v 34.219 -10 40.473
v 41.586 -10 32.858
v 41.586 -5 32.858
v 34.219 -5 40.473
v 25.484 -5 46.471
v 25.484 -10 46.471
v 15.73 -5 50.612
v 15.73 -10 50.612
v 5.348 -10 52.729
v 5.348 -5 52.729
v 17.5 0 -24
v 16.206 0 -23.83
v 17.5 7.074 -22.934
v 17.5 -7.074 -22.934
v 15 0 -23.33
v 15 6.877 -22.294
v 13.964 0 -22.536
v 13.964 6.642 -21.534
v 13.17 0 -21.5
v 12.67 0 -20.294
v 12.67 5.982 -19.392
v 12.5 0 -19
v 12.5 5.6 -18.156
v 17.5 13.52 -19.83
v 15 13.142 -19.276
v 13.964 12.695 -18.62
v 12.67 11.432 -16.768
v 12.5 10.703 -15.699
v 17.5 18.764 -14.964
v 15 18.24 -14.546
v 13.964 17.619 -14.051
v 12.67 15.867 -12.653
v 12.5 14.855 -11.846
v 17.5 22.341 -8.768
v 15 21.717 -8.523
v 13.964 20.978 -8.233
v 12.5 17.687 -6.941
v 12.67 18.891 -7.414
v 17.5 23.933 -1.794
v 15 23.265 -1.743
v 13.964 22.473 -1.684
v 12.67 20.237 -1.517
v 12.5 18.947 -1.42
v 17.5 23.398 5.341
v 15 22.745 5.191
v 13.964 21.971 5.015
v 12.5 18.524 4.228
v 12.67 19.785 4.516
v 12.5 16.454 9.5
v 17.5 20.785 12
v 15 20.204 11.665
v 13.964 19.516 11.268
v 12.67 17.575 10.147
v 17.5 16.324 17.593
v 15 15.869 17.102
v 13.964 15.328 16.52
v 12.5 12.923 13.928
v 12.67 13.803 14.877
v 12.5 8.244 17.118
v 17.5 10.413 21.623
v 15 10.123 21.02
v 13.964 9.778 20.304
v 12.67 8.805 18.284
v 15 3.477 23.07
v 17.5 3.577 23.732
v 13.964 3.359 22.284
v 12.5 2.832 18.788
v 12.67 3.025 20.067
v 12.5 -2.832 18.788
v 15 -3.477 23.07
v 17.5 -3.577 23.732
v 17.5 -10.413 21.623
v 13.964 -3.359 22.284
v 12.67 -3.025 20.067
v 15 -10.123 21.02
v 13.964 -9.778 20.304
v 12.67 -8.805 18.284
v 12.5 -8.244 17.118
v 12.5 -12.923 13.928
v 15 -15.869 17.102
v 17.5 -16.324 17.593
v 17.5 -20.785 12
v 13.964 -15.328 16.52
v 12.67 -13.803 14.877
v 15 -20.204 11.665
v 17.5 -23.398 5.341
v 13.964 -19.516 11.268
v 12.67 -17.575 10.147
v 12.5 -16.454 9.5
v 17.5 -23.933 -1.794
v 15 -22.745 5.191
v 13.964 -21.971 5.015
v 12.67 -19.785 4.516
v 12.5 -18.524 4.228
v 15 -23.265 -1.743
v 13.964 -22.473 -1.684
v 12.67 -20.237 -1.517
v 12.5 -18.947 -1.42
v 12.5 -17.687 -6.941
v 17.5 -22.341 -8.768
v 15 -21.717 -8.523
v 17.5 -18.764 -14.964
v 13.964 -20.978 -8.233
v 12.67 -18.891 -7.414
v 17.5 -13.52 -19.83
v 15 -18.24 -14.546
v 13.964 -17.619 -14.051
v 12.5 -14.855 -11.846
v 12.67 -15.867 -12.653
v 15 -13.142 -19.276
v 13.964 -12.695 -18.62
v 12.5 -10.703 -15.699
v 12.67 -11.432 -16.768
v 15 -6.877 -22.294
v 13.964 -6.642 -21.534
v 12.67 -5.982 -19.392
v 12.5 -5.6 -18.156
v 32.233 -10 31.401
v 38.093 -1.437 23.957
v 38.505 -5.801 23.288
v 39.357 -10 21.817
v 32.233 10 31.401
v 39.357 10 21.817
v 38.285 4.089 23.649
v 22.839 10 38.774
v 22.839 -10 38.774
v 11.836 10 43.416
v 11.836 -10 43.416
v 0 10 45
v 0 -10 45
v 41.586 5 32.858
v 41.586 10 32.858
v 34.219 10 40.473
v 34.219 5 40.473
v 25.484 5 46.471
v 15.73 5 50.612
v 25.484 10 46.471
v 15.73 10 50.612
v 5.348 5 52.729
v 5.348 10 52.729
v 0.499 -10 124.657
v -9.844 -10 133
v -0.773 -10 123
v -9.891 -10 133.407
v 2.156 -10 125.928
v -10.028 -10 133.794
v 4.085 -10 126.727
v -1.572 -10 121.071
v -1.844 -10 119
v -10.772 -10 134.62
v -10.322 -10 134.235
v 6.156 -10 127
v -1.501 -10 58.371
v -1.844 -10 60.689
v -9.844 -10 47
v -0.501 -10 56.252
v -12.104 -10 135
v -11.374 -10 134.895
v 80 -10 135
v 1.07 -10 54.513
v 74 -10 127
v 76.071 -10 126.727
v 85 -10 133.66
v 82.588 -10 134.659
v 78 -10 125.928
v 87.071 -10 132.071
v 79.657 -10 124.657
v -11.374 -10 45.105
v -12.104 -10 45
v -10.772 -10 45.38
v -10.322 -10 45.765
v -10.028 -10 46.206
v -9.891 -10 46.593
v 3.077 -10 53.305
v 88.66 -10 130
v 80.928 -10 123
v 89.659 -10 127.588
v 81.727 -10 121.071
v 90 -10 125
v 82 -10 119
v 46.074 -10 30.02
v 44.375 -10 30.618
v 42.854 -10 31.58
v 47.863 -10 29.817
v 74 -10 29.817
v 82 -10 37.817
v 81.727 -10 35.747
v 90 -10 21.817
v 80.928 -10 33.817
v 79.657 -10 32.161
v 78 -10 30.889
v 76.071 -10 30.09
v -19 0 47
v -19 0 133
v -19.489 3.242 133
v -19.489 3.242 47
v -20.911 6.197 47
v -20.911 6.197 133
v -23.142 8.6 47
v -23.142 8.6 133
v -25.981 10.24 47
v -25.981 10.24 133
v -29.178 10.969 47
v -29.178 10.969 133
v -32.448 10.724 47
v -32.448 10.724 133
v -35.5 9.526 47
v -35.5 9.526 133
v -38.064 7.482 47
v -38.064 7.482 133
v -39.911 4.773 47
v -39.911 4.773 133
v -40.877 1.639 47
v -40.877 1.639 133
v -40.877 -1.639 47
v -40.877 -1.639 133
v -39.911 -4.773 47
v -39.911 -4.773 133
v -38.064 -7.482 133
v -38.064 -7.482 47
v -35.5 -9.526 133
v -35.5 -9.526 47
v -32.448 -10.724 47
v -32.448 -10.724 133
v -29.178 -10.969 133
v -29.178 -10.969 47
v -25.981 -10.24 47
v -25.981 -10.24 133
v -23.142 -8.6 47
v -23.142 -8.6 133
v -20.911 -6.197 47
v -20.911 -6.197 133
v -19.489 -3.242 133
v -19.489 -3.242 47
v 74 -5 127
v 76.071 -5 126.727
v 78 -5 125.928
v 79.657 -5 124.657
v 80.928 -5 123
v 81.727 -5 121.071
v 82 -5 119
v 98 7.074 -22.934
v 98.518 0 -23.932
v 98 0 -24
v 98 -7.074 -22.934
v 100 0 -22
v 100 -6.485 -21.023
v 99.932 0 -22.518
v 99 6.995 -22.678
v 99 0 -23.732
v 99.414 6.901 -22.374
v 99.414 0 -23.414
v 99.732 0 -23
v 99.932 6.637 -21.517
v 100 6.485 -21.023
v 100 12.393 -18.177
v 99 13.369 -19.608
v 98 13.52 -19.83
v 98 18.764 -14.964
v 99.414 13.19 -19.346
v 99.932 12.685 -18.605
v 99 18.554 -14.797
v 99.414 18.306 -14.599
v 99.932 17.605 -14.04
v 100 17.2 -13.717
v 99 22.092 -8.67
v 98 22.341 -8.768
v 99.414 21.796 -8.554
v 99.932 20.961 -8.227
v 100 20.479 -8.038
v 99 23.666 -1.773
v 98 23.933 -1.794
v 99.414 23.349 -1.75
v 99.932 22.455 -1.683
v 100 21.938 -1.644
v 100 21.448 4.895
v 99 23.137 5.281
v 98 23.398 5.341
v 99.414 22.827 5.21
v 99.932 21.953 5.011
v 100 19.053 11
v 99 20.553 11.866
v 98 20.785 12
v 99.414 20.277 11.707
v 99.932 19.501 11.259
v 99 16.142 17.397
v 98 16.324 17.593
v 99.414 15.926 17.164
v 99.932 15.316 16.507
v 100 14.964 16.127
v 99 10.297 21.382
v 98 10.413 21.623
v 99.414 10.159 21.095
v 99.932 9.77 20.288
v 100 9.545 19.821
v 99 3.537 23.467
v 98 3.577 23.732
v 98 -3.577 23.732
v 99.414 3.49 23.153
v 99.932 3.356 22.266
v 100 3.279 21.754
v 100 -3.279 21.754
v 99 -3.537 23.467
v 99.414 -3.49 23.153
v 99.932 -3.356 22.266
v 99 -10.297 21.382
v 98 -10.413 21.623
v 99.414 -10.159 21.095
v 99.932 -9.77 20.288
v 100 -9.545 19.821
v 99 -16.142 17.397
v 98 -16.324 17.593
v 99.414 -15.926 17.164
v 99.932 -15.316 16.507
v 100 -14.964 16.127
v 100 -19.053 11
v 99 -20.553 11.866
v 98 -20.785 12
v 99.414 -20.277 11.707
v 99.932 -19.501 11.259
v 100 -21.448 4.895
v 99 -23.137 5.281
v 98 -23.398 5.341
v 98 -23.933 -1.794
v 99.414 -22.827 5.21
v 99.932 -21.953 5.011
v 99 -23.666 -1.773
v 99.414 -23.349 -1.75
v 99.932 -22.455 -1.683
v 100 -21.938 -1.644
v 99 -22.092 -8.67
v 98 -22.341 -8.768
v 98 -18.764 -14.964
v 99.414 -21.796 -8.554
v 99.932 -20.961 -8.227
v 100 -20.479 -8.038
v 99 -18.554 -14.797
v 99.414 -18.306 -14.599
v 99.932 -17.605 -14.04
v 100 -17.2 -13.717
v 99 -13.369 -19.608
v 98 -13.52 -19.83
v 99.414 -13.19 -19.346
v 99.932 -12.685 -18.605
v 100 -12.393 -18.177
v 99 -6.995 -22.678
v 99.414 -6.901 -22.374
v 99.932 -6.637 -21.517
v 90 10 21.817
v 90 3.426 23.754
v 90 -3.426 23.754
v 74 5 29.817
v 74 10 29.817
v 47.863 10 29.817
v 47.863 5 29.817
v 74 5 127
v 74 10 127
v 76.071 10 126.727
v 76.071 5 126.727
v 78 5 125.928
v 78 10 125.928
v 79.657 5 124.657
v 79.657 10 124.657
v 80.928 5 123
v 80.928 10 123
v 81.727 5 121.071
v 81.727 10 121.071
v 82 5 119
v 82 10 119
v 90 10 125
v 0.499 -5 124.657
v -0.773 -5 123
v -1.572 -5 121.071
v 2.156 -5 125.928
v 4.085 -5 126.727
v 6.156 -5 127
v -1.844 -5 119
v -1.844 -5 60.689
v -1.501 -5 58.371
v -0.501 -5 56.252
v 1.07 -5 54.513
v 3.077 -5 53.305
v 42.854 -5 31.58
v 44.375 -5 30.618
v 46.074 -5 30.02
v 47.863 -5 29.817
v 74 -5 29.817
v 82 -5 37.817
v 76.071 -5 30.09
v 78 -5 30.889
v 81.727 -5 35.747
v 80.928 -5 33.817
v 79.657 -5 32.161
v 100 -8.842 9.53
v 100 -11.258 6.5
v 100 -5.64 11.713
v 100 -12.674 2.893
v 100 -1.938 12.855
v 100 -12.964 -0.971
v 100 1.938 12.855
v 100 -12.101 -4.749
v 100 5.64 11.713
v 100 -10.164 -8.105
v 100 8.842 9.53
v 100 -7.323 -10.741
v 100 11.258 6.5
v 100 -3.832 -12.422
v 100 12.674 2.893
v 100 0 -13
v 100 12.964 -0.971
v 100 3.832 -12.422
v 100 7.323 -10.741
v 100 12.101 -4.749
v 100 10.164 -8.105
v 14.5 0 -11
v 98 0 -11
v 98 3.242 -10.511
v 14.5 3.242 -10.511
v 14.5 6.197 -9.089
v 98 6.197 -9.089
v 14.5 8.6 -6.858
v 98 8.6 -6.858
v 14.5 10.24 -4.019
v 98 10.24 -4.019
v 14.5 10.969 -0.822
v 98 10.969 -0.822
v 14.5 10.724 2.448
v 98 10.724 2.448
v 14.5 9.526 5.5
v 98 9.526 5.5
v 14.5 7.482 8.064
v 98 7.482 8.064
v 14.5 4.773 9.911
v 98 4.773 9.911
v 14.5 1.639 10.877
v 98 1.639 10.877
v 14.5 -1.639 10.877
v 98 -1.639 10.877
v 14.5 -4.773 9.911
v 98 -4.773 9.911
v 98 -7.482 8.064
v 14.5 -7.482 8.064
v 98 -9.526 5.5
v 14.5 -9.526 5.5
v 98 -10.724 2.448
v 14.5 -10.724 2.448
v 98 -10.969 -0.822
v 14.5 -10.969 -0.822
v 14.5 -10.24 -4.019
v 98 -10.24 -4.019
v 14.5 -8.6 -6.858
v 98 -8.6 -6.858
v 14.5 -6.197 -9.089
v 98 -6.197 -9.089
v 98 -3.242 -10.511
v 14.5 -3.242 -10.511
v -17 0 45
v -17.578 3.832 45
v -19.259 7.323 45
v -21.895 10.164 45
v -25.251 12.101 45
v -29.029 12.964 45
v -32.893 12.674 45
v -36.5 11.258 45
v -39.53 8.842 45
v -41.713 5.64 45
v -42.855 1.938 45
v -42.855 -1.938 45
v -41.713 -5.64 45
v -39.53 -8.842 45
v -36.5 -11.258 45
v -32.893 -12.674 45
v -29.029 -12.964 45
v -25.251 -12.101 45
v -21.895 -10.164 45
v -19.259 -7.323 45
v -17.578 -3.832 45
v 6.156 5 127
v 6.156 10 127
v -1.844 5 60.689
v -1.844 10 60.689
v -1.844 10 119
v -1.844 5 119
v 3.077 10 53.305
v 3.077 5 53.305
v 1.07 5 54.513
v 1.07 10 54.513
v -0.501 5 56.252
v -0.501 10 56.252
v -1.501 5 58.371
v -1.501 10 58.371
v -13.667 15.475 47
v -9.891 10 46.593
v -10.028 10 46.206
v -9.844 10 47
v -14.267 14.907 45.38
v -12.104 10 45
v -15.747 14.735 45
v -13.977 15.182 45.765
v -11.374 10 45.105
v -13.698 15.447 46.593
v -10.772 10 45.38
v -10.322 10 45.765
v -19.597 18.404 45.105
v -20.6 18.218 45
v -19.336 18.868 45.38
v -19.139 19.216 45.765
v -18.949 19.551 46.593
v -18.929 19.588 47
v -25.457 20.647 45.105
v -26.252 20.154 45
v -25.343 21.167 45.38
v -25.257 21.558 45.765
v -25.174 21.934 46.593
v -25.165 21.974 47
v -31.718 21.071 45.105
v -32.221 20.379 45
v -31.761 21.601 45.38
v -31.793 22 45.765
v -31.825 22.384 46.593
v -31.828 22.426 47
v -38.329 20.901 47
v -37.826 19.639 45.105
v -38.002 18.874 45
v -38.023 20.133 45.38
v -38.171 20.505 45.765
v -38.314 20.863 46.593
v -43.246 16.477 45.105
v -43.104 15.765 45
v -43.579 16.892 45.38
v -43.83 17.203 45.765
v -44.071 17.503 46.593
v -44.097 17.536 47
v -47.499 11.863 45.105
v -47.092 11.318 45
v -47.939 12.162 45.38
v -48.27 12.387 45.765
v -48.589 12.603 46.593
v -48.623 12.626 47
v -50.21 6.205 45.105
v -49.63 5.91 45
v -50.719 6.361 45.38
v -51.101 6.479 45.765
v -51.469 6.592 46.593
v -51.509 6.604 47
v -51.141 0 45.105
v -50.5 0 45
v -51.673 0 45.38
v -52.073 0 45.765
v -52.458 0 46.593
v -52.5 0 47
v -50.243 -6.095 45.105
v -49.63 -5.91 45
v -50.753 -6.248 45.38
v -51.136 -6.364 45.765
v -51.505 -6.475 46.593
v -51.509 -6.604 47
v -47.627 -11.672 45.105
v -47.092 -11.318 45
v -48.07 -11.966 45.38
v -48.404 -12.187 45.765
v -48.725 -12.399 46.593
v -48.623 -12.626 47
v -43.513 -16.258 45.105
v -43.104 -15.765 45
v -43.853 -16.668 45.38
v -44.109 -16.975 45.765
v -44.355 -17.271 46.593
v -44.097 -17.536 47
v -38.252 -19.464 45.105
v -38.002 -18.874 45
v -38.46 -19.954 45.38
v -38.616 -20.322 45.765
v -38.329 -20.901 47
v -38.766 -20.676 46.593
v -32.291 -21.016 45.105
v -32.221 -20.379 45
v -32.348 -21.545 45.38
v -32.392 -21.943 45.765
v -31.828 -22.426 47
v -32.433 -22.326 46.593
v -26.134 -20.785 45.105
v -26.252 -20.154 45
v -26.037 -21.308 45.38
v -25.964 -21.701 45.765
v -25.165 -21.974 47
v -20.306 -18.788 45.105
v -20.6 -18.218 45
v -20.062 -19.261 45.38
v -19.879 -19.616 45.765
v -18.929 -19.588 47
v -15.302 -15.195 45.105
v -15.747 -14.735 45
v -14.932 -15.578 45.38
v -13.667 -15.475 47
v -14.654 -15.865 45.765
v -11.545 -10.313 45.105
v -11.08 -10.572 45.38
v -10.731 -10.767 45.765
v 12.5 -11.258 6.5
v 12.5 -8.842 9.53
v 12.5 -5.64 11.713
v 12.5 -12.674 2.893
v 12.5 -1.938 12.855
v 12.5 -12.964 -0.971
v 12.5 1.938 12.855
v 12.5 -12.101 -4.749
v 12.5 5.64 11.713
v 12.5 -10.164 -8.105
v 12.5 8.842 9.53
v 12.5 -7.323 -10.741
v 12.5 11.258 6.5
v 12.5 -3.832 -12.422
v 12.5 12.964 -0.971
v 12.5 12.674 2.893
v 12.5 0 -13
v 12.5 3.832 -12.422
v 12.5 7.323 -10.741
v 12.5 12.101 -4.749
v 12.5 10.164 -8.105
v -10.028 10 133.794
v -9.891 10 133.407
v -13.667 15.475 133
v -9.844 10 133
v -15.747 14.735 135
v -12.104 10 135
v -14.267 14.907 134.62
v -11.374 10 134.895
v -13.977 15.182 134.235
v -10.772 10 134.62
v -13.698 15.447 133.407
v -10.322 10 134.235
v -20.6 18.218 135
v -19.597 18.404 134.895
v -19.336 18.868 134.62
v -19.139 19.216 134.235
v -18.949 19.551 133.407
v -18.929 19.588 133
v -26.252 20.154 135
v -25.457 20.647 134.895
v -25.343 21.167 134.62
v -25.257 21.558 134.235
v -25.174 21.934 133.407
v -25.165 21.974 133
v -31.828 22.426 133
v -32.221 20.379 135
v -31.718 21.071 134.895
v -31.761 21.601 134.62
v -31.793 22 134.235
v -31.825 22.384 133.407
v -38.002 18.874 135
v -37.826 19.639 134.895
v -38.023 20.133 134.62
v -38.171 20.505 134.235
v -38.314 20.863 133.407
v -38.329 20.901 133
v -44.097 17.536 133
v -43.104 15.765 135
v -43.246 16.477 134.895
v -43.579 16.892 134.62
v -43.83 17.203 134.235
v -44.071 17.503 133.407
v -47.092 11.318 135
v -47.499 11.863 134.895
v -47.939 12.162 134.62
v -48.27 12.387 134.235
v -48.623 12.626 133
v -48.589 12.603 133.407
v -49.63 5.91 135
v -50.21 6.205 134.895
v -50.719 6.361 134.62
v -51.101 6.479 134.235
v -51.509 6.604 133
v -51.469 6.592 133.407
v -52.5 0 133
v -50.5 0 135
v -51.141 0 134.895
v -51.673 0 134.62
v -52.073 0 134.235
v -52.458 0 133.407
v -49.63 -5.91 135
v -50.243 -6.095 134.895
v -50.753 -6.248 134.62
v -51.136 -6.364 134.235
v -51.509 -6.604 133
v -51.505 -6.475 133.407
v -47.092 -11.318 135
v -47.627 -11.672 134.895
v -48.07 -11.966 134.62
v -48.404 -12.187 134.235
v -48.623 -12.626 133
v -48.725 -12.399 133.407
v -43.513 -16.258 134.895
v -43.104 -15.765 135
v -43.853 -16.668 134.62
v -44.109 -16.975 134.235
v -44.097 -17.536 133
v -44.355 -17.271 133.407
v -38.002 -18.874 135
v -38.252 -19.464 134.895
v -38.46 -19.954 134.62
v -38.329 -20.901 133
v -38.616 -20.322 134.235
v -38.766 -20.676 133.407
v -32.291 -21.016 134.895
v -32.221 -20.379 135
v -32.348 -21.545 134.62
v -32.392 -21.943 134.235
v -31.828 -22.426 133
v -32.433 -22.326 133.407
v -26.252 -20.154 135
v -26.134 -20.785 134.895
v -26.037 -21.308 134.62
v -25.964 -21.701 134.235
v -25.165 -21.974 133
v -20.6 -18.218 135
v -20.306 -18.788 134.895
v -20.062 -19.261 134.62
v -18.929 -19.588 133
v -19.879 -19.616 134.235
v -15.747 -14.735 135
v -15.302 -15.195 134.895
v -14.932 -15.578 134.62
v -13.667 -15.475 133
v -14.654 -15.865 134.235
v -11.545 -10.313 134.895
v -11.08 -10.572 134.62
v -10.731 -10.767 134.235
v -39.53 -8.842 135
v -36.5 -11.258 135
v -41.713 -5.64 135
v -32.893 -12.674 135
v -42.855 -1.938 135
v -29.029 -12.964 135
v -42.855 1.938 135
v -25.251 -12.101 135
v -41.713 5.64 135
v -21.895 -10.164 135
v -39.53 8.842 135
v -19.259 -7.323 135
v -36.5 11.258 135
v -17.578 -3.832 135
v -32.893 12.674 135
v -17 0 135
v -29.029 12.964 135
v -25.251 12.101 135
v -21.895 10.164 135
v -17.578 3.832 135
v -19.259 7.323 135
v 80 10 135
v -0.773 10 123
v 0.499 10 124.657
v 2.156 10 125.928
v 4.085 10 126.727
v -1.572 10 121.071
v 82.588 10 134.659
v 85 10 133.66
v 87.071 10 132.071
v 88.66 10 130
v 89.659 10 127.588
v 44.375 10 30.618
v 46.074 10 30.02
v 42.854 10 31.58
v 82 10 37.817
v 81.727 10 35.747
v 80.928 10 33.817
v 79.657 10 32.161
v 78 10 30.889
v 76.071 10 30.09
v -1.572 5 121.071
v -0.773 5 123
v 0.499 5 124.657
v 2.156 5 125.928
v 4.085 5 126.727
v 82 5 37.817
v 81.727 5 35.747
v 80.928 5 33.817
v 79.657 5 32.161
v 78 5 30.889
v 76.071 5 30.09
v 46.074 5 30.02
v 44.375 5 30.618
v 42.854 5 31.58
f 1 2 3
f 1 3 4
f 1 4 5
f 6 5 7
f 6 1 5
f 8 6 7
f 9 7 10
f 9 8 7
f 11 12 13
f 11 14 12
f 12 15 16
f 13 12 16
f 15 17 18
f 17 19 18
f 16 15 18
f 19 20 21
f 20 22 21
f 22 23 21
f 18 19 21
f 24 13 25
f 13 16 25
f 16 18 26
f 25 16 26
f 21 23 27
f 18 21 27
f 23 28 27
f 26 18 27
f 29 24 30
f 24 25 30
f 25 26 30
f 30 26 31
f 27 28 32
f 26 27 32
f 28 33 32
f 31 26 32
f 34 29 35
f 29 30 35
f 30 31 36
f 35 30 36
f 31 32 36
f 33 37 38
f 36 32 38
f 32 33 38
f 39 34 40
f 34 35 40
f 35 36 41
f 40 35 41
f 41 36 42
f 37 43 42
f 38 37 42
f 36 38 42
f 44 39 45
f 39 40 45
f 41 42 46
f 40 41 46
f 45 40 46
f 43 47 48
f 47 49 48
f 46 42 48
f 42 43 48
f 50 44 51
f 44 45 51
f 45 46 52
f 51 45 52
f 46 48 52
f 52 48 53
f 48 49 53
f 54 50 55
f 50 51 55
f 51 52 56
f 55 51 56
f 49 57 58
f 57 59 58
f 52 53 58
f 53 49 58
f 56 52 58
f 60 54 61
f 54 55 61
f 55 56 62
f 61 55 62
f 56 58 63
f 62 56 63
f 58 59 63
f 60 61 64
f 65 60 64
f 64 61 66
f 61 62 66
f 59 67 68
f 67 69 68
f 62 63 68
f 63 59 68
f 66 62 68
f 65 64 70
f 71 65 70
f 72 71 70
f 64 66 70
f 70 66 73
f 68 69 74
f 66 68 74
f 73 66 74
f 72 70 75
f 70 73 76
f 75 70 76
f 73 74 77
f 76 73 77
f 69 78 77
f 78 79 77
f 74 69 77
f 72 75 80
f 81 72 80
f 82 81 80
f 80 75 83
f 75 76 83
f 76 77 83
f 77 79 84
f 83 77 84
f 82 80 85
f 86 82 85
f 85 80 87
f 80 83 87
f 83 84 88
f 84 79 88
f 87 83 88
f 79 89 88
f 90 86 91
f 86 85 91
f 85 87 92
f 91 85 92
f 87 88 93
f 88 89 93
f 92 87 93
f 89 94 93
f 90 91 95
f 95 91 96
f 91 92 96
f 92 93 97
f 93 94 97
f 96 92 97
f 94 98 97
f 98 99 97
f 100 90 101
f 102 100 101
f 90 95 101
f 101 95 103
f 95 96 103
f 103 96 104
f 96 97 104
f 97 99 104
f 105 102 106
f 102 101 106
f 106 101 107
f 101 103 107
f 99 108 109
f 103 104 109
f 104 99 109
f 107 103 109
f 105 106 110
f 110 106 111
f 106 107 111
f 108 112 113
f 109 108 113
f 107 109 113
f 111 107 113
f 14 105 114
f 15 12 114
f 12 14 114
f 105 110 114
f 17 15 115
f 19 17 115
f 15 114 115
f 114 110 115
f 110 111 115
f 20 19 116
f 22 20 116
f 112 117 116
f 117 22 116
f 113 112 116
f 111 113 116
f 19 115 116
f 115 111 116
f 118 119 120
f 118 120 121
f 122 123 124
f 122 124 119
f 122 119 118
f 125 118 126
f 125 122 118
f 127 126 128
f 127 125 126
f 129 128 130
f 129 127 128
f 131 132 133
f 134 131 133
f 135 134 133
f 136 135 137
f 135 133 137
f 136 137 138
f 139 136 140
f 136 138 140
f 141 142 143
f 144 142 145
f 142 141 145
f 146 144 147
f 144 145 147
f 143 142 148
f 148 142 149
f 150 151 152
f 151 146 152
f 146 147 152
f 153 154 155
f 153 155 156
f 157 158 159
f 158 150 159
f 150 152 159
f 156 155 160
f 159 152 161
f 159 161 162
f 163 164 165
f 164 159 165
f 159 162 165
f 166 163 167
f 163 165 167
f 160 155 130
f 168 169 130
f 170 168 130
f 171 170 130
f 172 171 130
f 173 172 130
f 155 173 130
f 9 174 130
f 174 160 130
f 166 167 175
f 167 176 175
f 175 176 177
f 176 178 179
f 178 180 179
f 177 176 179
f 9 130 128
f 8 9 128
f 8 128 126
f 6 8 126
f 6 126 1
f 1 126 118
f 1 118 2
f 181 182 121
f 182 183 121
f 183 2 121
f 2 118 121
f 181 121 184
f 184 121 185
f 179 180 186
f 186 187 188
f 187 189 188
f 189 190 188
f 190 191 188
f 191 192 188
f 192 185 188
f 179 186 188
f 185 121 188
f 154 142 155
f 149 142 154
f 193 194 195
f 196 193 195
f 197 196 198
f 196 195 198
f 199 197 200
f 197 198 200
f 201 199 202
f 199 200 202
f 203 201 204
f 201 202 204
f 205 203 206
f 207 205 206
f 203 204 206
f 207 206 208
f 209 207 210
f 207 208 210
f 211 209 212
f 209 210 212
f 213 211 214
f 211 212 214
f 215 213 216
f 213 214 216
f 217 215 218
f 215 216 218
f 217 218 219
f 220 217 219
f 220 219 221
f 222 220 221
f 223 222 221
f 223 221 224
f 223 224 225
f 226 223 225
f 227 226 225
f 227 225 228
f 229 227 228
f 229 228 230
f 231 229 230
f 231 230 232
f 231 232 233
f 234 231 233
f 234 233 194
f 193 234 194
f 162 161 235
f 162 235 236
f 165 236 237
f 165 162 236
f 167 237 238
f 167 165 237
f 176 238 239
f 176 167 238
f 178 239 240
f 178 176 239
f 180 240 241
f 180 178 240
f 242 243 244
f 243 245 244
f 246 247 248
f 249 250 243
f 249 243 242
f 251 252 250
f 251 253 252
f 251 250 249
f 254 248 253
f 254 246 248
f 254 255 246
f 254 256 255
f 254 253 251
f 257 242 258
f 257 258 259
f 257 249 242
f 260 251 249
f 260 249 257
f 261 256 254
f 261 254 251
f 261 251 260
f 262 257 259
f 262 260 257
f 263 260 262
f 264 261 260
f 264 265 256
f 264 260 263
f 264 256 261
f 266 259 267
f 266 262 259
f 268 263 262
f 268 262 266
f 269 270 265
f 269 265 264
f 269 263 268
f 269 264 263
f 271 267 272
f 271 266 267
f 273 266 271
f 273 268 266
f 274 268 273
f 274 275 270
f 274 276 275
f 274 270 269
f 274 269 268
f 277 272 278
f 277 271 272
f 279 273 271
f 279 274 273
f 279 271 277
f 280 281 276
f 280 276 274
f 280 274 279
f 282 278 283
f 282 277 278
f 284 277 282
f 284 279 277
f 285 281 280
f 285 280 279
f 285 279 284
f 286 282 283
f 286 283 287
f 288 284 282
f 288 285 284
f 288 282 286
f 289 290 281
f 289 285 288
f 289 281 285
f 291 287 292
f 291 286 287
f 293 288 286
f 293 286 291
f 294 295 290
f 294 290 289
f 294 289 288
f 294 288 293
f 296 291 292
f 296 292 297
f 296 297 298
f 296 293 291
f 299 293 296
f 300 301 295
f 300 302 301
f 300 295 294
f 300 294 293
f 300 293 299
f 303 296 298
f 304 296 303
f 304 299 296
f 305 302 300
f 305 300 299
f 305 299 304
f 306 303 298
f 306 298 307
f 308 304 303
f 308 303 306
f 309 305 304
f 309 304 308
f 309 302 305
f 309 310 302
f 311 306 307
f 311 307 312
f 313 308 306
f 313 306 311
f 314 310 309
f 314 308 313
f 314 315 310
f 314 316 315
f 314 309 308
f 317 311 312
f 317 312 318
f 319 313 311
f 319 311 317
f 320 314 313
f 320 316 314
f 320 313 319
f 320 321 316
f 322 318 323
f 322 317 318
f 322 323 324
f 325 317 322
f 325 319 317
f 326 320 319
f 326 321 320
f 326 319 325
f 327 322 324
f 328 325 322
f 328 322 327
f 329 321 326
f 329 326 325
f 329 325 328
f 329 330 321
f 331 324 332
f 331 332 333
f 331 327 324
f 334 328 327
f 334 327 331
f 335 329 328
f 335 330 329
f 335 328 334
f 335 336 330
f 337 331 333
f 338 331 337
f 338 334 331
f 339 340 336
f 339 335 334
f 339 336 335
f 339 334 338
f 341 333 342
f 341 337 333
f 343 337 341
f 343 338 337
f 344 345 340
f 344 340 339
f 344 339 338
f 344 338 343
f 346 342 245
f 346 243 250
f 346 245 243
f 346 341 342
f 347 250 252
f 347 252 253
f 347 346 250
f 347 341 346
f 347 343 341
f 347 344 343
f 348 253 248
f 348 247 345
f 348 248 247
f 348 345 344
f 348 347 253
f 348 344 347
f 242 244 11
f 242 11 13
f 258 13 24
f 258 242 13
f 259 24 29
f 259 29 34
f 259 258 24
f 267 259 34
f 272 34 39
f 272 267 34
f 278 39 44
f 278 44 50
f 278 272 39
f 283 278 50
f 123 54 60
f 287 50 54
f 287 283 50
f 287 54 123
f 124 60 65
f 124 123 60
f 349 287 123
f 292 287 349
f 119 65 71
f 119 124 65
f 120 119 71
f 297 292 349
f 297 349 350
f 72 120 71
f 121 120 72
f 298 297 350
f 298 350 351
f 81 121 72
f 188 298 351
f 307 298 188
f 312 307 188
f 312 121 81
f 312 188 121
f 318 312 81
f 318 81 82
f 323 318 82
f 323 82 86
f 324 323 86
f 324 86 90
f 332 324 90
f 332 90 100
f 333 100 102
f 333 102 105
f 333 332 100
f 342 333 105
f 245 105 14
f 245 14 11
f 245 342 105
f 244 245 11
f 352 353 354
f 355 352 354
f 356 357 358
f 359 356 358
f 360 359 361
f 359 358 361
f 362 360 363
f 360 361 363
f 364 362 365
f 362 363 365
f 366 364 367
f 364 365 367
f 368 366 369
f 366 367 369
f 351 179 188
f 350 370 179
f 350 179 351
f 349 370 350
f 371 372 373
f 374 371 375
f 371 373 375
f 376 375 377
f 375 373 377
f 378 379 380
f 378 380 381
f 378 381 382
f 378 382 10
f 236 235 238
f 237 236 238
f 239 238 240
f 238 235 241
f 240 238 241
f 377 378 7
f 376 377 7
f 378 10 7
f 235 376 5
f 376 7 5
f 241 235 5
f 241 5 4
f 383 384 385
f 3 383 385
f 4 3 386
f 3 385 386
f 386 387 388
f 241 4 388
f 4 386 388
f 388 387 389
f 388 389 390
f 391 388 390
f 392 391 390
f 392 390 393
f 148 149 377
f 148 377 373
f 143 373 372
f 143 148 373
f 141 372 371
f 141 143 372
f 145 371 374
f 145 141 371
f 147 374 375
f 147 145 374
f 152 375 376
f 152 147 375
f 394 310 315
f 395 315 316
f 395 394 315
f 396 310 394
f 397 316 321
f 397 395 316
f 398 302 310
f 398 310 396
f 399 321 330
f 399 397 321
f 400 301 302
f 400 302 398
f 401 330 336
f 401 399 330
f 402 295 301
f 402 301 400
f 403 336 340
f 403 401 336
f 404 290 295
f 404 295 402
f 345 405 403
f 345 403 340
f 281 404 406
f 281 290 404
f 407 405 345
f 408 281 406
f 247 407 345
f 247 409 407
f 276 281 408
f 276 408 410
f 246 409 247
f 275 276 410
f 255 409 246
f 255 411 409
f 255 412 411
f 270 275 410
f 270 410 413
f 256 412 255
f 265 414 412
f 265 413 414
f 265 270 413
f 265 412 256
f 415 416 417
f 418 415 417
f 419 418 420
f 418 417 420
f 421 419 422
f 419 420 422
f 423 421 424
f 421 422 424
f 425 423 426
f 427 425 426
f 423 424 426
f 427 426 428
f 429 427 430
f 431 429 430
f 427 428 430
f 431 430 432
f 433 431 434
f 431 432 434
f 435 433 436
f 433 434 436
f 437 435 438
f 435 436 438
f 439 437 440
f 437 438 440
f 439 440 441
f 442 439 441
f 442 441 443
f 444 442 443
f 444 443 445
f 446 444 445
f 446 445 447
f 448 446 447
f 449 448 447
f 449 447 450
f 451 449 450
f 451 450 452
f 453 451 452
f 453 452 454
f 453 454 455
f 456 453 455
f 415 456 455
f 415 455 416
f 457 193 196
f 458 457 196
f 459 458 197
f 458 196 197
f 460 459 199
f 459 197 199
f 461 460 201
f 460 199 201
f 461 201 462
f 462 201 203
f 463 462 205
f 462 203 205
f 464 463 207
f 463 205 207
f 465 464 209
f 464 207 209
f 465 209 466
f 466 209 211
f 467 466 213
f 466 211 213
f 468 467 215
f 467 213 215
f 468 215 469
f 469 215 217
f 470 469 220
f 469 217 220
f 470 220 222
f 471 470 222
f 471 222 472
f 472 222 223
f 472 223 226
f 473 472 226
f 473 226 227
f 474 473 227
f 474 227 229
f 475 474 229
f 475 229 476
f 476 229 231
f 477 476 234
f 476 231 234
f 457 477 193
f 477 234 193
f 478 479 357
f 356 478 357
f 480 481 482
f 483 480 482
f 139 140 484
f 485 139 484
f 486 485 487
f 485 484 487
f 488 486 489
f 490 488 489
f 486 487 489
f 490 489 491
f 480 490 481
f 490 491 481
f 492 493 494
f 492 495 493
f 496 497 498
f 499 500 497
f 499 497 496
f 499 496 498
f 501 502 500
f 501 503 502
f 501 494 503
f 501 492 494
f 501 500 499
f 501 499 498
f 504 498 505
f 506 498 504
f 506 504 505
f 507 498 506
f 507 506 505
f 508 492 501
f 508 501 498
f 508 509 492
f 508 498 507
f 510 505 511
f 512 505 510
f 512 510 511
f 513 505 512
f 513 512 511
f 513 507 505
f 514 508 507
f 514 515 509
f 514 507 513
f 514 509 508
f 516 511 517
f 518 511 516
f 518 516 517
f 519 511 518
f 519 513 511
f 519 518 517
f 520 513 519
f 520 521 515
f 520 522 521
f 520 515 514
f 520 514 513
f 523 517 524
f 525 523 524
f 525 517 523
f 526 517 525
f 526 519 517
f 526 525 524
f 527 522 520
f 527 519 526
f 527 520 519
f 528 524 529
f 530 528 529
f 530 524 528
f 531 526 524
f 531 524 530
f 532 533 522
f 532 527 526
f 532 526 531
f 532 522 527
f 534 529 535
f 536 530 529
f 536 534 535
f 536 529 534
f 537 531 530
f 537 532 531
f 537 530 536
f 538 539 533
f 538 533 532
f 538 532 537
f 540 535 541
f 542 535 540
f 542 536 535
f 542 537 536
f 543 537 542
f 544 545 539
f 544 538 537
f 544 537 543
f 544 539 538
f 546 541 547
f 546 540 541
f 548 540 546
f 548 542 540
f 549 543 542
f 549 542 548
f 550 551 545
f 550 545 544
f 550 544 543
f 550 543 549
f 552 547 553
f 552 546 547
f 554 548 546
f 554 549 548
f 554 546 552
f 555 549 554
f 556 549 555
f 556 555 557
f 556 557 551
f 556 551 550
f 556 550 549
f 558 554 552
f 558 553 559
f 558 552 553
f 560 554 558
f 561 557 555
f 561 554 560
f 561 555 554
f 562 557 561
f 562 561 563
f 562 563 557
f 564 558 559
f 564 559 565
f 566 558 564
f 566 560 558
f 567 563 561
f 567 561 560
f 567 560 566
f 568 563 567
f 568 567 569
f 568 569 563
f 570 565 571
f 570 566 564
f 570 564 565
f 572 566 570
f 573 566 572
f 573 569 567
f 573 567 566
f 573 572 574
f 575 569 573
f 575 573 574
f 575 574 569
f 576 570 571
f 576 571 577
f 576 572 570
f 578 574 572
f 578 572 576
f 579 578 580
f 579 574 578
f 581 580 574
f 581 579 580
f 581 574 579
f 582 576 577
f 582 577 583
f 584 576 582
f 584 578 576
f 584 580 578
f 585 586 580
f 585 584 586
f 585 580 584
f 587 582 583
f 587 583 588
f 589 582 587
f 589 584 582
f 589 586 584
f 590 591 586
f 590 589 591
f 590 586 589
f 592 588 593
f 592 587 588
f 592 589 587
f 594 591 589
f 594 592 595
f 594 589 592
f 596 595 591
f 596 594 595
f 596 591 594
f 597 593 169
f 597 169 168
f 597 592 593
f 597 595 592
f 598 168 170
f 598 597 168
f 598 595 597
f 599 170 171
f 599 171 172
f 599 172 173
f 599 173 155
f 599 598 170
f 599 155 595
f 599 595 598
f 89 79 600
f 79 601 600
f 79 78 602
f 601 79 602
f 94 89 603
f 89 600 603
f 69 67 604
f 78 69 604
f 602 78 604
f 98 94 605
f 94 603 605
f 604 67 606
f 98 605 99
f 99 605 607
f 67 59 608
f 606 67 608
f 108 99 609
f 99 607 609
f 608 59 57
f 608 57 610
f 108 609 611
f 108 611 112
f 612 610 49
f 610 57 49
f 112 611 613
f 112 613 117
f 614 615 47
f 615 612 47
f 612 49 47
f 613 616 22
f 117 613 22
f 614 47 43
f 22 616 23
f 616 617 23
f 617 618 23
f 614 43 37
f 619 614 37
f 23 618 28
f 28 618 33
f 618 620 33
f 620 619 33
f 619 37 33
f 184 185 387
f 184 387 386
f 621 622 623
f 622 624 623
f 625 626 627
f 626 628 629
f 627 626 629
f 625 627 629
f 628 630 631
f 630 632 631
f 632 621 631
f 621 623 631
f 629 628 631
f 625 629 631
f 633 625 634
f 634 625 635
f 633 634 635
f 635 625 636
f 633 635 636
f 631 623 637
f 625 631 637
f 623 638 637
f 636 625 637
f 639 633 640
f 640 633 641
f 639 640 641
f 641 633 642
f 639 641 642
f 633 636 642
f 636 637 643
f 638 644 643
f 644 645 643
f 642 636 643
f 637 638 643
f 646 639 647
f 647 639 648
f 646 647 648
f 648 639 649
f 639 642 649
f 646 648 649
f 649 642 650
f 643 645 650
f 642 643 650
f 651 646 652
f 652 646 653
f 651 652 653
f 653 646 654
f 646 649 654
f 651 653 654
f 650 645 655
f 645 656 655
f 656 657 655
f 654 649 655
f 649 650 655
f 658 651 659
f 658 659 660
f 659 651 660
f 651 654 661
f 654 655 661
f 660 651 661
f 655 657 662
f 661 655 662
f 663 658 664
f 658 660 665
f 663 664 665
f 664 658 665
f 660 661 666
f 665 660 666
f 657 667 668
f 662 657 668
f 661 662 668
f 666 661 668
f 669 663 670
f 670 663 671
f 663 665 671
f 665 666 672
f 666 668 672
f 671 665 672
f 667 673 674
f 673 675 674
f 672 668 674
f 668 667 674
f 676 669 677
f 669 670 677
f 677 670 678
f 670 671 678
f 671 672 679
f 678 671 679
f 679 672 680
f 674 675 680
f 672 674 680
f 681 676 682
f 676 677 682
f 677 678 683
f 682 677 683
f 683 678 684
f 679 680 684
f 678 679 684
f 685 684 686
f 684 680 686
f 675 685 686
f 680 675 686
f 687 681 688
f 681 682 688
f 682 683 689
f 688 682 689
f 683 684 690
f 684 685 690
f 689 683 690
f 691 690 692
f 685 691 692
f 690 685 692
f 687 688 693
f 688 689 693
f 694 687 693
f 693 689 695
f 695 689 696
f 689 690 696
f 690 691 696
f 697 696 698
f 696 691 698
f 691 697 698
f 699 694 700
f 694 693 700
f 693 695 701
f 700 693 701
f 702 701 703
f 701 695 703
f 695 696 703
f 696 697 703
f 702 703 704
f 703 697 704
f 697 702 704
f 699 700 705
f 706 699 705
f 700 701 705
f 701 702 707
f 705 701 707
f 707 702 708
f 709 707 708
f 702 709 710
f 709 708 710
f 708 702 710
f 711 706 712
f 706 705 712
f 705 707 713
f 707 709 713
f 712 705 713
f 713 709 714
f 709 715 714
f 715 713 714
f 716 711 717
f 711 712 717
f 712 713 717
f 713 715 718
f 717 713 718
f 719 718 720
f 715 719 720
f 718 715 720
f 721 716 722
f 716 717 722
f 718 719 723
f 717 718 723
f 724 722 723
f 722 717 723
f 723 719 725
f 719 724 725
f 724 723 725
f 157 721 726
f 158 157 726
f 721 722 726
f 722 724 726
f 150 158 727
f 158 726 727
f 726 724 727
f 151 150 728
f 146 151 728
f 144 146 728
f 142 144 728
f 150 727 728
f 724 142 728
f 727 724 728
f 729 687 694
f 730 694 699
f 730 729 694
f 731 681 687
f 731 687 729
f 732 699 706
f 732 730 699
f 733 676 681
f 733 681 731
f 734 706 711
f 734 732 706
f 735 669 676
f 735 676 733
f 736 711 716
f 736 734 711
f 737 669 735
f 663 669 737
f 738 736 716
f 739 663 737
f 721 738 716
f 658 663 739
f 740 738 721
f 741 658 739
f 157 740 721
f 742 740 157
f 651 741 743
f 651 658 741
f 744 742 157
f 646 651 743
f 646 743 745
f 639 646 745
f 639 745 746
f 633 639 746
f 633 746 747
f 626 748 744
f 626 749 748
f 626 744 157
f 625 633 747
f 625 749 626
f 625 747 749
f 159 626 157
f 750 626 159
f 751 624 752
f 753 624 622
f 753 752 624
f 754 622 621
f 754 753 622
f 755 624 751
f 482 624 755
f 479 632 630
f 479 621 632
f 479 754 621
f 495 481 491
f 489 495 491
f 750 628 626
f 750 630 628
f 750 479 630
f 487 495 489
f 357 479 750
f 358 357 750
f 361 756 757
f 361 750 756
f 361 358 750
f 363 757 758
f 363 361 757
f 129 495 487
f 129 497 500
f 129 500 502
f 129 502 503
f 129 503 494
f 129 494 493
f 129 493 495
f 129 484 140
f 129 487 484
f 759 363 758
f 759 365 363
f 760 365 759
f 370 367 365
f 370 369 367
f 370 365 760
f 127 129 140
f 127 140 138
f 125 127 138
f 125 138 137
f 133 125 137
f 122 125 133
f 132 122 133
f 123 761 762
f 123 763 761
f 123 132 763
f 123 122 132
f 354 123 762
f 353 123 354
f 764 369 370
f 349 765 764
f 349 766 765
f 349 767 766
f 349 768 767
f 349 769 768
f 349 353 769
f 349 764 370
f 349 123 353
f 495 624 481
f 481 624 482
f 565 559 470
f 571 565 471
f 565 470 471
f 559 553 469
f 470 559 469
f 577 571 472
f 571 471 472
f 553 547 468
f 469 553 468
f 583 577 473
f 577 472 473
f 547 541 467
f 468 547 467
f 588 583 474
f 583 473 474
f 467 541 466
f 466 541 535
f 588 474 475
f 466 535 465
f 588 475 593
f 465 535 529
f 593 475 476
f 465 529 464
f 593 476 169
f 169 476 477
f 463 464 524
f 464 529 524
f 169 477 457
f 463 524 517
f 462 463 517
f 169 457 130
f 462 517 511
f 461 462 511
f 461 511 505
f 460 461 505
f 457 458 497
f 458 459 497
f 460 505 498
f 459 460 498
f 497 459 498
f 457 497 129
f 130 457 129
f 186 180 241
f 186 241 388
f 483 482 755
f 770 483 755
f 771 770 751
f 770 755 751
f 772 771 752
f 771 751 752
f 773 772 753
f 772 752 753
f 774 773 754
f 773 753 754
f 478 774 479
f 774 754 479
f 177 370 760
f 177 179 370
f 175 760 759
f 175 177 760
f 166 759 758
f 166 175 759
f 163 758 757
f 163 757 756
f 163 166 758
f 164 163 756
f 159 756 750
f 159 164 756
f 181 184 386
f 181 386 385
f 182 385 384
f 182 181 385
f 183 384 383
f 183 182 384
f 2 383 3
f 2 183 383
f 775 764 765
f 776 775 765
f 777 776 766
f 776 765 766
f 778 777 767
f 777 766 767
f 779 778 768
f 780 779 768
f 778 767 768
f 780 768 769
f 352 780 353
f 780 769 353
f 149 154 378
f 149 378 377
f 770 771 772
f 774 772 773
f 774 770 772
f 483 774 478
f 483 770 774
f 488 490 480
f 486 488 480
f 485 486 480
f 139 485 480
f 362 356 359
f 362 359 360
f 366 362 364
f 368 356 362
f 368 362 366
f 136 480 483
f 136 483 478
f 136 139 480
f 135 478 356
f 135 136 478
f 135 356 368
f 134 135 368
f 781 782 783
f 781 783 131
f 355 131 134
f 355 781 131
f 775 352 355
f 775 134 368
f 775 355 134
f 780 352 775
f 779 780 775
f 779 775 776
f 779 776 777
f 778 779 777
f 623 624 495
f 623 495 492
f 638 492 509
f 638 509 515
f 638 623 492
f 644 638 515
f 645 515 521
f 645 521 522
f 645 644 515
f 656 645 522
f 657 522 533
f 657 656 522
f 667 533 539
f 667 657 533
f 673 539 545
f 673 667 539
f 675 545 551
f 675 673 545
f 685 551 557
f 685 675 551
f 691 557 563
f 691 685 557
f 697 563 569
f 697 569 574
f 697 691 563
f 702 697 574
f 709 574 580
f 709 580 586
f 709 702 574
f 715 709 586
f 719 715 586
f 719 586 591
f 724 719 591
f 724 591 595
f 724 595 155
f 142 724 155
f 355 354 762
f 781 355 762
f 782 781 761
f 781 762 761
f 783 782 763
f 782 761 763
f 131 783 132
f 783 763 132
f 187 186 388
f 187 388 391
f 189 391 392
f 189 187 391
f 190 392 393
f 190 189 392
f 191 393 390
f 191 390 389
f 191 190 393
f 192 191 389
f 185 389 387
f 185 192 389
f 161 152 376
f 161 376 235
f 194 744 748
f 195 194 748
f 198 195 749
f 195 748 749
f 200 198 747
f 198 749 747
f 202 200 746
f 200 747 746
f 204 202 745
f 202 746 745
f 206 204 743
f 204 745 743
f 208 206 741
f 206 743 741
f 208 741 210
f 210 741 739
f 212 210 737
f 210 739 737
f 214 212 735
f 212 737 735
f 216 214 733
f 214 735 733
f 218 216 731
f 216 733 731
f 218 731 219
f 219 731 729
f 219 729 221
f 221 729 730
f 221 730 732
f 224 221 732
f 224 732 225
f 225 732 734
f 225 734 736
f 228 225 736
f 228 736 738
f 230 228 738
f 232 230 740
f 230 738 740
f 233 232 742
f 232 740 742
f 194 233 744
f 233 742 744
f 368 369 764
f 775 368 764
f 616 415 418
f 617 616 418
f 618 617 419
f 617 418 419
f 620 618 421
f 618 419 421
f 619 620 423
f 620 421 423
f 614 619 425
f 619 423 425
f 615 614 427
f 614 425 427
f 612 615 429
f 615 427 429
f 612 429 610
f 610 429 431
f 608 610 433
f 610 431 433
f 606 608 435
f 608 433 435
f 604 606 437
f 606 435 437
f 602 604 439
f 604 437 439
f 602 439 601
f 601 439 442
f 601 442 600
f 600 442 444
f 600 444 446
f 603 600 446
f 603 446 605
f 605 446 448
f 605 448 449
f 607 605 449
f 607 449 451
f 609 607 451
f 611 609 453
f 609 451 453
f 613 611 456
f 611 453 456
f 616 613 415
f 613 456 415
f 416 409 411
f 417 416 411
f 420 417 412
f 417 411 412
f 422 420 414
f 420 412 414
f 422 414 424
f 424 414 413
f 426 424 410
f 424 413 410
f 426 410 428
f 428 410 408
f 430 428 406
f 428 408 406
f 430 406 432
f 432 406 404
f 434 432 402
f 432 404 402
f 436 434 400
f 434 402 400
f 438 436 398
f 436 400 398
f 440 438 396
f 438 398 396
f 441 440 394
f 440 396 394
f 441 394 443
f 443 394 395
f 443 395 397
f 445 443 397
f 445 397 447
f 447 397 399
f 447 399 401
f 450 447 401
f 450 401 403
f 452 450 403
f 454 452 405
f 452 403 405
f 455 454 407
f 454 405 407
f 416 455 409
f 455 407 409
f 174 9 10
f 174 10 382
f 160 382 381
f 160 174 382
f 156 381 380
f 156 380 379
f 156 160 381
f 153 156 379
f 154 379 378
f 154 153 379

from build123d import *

# Parameters (mm, degrees)
BOSS_EXTRUDE1_DEPTH = 10
SKETCH2_R           = 22.5
BOSS_EXTRUDE2_DEPTH = 90
SKETCH3_R           = 11
CUT_EXTRUDE1_DEPTH  = 164.802472509
BOSS_EXTRUDE3_START = 10
SKETCH4_R           = 24
BOSS_EXTRUDE3_DEPTH = 87.5
SKETCH5_R           = 11
CUT_EXTRUDE2_DEPTH  = 206.078643463
CUT_EXTRUDE3_DEPTH  = 5
FILLET1_R           = 10
FILLET2_R           = 5
FILLET3_R           = 2
CHAMFER1_SIZE       = 2


with BuildPart() as part:
    # Sketch1 → Boss-Extrude1 (new, symmetric)
    with BuildSketch(Plane(origin=(0, 0, 0), x_dir=(1, 0, 0), z_dir=(0, 1, 0))):
        with BuildLine():
            ThreePointArc((45, 0), (31.819805153, -31.819805153), (0, -45))
            Line((0, -45), (-45, -45))
            Line((-45, -45), (-45, -135))
            Line((-45, -135), (90, -135))
            Line((90, -135), (90, 0))
            Line((90, 0), (45, 0))
        make_face()
    extrude(amount=BOSS_EXTRUDE1_DEPTH, both=True)

    # Sketch2 → Boss-Extrude2 (add)
    with BuildSketch(Plane.XY.offset(135)):
        with Locations((-30, 0)):
            Circle(SKETCH2_R)
    extrude(amount=-BOSS_EXTRUDE2_DEPTH)

    # Sketch3 → Cut-Extrude1 (cut, through all)
    with BuildSketch(Plane.XY.offset(135)):
        with Locations((-30, 0)):
            Circle(SKETCH3_R)
    extrude(amount=-CUT_EXTRUDE1_DEPTH, mode=Mode.SUBTRACT)

    # Sketch4 → Boss-Extrude3 (add)
    with BuildSketch(Plane(origin=(90, 0, 0), x_dir=(0, 0, -1), z_dir=(1, 0, 0)).offset(BOSS_EXTRUDE3_START)):
        Circle(SKETCH4_R)
    extrude(amount=-BOSS_EXTRUDE3_DEPTH)

    # Sketch5 → Cut-Extrude2 (cut, through all)
    with BuildSketch(Plane(origin=(100, 0, 0), x_dir=(0, 0, -1), z_dir=(1, 0, 0))):
        Circle(SKETCH5_R)
    extrude(amount=-CUT_EXTRUDE2_DEPTH, mode=Mode.SUBTRACT)

    # Sketch6 → Cut-Extrude3 (cut)
    with BuildSketch(Plane(origin=(0, 10, 0), x_dir=(1, 0, 0), z_dir=(0, 1, 0))):
        with BuildLine():
            Line((74, -29.817424229), (47.862745687, -29.817424229))
            ThreePointArc((47.862745687, -29.817424229), (44.375432792, -30.617518065), (41.585664285, -32.857762035))
            ThreePointArc((41.585664285, -32.857762035), (25.48374719, -46.471266705), (5.348346748, -52.729452748))
            ThreePointArc((5.348346748, -52.729452748), (0.220226063, -55.324772633), (-1.844355629, -60.688615426))
            Line((-1.844355629, -60.688615426), (-1.844355629, -119))
            ThreePointArc((-1.844355629, -119), (0.498790121, -124.656854249), (6.155644371, -127))
            Line((6.155644371, -127), (74, -127))
            ThreePointArc((74, -127), (79.656854249, -124.656854249), (82, -119))
            Line((82, -119), (82, -37.817424229))
            ThreePointArc((82, -37.817424229), (79.656854249, -32.16056998), (74, -29.817424229))
        make_face()
    cut_extrude3 = extrude(amount=-CUT_EXTRUDE3_DEPTH, mode=Mode.SUBTRACT)

    # Mirror1: Cut-Extrude3 across plane
    add(cut_extrude3.mirror(Plane.ZX), mode=Mode.SUBTRACT)

    # Fillet1
    fillet1_edges = [part.edges().sort_by_distance(p)[0] for p in [
        (90, 0, 135),
    ]]
    fillet(fillet1_edges, radius=FILLET1_R)

    # Fillet2
    fillet2_edges = [part.edges().sort_by_distance(p)[0] for p in [
        (12.5, 0, 24),
    ]]
    fillet(fillet2_edges, radius=FILLET2_R)

    # Fillet3
    fillet3_edges = [part.edges().sort_by_distance(p)[0] for p in [
        (-52.5, 0, 45),
        (-52.5, 0, 135),
        (100, 0, 24),
    ]]
    fillet(fillet3_edges, radius=FILLET3_R)

    # Chamfer1
    chamfer1_edges = [part.edges().sort_by_distance(p)[0] for p in [
        (-41, 0, 45),
        (-41, 0, 135),
        (12.5, 0, 11),
        (100, 0, 11),
    ]]
    chamfer(chamfer1_edges, length=CHAMFER1_SIZE)


solid = part.part
